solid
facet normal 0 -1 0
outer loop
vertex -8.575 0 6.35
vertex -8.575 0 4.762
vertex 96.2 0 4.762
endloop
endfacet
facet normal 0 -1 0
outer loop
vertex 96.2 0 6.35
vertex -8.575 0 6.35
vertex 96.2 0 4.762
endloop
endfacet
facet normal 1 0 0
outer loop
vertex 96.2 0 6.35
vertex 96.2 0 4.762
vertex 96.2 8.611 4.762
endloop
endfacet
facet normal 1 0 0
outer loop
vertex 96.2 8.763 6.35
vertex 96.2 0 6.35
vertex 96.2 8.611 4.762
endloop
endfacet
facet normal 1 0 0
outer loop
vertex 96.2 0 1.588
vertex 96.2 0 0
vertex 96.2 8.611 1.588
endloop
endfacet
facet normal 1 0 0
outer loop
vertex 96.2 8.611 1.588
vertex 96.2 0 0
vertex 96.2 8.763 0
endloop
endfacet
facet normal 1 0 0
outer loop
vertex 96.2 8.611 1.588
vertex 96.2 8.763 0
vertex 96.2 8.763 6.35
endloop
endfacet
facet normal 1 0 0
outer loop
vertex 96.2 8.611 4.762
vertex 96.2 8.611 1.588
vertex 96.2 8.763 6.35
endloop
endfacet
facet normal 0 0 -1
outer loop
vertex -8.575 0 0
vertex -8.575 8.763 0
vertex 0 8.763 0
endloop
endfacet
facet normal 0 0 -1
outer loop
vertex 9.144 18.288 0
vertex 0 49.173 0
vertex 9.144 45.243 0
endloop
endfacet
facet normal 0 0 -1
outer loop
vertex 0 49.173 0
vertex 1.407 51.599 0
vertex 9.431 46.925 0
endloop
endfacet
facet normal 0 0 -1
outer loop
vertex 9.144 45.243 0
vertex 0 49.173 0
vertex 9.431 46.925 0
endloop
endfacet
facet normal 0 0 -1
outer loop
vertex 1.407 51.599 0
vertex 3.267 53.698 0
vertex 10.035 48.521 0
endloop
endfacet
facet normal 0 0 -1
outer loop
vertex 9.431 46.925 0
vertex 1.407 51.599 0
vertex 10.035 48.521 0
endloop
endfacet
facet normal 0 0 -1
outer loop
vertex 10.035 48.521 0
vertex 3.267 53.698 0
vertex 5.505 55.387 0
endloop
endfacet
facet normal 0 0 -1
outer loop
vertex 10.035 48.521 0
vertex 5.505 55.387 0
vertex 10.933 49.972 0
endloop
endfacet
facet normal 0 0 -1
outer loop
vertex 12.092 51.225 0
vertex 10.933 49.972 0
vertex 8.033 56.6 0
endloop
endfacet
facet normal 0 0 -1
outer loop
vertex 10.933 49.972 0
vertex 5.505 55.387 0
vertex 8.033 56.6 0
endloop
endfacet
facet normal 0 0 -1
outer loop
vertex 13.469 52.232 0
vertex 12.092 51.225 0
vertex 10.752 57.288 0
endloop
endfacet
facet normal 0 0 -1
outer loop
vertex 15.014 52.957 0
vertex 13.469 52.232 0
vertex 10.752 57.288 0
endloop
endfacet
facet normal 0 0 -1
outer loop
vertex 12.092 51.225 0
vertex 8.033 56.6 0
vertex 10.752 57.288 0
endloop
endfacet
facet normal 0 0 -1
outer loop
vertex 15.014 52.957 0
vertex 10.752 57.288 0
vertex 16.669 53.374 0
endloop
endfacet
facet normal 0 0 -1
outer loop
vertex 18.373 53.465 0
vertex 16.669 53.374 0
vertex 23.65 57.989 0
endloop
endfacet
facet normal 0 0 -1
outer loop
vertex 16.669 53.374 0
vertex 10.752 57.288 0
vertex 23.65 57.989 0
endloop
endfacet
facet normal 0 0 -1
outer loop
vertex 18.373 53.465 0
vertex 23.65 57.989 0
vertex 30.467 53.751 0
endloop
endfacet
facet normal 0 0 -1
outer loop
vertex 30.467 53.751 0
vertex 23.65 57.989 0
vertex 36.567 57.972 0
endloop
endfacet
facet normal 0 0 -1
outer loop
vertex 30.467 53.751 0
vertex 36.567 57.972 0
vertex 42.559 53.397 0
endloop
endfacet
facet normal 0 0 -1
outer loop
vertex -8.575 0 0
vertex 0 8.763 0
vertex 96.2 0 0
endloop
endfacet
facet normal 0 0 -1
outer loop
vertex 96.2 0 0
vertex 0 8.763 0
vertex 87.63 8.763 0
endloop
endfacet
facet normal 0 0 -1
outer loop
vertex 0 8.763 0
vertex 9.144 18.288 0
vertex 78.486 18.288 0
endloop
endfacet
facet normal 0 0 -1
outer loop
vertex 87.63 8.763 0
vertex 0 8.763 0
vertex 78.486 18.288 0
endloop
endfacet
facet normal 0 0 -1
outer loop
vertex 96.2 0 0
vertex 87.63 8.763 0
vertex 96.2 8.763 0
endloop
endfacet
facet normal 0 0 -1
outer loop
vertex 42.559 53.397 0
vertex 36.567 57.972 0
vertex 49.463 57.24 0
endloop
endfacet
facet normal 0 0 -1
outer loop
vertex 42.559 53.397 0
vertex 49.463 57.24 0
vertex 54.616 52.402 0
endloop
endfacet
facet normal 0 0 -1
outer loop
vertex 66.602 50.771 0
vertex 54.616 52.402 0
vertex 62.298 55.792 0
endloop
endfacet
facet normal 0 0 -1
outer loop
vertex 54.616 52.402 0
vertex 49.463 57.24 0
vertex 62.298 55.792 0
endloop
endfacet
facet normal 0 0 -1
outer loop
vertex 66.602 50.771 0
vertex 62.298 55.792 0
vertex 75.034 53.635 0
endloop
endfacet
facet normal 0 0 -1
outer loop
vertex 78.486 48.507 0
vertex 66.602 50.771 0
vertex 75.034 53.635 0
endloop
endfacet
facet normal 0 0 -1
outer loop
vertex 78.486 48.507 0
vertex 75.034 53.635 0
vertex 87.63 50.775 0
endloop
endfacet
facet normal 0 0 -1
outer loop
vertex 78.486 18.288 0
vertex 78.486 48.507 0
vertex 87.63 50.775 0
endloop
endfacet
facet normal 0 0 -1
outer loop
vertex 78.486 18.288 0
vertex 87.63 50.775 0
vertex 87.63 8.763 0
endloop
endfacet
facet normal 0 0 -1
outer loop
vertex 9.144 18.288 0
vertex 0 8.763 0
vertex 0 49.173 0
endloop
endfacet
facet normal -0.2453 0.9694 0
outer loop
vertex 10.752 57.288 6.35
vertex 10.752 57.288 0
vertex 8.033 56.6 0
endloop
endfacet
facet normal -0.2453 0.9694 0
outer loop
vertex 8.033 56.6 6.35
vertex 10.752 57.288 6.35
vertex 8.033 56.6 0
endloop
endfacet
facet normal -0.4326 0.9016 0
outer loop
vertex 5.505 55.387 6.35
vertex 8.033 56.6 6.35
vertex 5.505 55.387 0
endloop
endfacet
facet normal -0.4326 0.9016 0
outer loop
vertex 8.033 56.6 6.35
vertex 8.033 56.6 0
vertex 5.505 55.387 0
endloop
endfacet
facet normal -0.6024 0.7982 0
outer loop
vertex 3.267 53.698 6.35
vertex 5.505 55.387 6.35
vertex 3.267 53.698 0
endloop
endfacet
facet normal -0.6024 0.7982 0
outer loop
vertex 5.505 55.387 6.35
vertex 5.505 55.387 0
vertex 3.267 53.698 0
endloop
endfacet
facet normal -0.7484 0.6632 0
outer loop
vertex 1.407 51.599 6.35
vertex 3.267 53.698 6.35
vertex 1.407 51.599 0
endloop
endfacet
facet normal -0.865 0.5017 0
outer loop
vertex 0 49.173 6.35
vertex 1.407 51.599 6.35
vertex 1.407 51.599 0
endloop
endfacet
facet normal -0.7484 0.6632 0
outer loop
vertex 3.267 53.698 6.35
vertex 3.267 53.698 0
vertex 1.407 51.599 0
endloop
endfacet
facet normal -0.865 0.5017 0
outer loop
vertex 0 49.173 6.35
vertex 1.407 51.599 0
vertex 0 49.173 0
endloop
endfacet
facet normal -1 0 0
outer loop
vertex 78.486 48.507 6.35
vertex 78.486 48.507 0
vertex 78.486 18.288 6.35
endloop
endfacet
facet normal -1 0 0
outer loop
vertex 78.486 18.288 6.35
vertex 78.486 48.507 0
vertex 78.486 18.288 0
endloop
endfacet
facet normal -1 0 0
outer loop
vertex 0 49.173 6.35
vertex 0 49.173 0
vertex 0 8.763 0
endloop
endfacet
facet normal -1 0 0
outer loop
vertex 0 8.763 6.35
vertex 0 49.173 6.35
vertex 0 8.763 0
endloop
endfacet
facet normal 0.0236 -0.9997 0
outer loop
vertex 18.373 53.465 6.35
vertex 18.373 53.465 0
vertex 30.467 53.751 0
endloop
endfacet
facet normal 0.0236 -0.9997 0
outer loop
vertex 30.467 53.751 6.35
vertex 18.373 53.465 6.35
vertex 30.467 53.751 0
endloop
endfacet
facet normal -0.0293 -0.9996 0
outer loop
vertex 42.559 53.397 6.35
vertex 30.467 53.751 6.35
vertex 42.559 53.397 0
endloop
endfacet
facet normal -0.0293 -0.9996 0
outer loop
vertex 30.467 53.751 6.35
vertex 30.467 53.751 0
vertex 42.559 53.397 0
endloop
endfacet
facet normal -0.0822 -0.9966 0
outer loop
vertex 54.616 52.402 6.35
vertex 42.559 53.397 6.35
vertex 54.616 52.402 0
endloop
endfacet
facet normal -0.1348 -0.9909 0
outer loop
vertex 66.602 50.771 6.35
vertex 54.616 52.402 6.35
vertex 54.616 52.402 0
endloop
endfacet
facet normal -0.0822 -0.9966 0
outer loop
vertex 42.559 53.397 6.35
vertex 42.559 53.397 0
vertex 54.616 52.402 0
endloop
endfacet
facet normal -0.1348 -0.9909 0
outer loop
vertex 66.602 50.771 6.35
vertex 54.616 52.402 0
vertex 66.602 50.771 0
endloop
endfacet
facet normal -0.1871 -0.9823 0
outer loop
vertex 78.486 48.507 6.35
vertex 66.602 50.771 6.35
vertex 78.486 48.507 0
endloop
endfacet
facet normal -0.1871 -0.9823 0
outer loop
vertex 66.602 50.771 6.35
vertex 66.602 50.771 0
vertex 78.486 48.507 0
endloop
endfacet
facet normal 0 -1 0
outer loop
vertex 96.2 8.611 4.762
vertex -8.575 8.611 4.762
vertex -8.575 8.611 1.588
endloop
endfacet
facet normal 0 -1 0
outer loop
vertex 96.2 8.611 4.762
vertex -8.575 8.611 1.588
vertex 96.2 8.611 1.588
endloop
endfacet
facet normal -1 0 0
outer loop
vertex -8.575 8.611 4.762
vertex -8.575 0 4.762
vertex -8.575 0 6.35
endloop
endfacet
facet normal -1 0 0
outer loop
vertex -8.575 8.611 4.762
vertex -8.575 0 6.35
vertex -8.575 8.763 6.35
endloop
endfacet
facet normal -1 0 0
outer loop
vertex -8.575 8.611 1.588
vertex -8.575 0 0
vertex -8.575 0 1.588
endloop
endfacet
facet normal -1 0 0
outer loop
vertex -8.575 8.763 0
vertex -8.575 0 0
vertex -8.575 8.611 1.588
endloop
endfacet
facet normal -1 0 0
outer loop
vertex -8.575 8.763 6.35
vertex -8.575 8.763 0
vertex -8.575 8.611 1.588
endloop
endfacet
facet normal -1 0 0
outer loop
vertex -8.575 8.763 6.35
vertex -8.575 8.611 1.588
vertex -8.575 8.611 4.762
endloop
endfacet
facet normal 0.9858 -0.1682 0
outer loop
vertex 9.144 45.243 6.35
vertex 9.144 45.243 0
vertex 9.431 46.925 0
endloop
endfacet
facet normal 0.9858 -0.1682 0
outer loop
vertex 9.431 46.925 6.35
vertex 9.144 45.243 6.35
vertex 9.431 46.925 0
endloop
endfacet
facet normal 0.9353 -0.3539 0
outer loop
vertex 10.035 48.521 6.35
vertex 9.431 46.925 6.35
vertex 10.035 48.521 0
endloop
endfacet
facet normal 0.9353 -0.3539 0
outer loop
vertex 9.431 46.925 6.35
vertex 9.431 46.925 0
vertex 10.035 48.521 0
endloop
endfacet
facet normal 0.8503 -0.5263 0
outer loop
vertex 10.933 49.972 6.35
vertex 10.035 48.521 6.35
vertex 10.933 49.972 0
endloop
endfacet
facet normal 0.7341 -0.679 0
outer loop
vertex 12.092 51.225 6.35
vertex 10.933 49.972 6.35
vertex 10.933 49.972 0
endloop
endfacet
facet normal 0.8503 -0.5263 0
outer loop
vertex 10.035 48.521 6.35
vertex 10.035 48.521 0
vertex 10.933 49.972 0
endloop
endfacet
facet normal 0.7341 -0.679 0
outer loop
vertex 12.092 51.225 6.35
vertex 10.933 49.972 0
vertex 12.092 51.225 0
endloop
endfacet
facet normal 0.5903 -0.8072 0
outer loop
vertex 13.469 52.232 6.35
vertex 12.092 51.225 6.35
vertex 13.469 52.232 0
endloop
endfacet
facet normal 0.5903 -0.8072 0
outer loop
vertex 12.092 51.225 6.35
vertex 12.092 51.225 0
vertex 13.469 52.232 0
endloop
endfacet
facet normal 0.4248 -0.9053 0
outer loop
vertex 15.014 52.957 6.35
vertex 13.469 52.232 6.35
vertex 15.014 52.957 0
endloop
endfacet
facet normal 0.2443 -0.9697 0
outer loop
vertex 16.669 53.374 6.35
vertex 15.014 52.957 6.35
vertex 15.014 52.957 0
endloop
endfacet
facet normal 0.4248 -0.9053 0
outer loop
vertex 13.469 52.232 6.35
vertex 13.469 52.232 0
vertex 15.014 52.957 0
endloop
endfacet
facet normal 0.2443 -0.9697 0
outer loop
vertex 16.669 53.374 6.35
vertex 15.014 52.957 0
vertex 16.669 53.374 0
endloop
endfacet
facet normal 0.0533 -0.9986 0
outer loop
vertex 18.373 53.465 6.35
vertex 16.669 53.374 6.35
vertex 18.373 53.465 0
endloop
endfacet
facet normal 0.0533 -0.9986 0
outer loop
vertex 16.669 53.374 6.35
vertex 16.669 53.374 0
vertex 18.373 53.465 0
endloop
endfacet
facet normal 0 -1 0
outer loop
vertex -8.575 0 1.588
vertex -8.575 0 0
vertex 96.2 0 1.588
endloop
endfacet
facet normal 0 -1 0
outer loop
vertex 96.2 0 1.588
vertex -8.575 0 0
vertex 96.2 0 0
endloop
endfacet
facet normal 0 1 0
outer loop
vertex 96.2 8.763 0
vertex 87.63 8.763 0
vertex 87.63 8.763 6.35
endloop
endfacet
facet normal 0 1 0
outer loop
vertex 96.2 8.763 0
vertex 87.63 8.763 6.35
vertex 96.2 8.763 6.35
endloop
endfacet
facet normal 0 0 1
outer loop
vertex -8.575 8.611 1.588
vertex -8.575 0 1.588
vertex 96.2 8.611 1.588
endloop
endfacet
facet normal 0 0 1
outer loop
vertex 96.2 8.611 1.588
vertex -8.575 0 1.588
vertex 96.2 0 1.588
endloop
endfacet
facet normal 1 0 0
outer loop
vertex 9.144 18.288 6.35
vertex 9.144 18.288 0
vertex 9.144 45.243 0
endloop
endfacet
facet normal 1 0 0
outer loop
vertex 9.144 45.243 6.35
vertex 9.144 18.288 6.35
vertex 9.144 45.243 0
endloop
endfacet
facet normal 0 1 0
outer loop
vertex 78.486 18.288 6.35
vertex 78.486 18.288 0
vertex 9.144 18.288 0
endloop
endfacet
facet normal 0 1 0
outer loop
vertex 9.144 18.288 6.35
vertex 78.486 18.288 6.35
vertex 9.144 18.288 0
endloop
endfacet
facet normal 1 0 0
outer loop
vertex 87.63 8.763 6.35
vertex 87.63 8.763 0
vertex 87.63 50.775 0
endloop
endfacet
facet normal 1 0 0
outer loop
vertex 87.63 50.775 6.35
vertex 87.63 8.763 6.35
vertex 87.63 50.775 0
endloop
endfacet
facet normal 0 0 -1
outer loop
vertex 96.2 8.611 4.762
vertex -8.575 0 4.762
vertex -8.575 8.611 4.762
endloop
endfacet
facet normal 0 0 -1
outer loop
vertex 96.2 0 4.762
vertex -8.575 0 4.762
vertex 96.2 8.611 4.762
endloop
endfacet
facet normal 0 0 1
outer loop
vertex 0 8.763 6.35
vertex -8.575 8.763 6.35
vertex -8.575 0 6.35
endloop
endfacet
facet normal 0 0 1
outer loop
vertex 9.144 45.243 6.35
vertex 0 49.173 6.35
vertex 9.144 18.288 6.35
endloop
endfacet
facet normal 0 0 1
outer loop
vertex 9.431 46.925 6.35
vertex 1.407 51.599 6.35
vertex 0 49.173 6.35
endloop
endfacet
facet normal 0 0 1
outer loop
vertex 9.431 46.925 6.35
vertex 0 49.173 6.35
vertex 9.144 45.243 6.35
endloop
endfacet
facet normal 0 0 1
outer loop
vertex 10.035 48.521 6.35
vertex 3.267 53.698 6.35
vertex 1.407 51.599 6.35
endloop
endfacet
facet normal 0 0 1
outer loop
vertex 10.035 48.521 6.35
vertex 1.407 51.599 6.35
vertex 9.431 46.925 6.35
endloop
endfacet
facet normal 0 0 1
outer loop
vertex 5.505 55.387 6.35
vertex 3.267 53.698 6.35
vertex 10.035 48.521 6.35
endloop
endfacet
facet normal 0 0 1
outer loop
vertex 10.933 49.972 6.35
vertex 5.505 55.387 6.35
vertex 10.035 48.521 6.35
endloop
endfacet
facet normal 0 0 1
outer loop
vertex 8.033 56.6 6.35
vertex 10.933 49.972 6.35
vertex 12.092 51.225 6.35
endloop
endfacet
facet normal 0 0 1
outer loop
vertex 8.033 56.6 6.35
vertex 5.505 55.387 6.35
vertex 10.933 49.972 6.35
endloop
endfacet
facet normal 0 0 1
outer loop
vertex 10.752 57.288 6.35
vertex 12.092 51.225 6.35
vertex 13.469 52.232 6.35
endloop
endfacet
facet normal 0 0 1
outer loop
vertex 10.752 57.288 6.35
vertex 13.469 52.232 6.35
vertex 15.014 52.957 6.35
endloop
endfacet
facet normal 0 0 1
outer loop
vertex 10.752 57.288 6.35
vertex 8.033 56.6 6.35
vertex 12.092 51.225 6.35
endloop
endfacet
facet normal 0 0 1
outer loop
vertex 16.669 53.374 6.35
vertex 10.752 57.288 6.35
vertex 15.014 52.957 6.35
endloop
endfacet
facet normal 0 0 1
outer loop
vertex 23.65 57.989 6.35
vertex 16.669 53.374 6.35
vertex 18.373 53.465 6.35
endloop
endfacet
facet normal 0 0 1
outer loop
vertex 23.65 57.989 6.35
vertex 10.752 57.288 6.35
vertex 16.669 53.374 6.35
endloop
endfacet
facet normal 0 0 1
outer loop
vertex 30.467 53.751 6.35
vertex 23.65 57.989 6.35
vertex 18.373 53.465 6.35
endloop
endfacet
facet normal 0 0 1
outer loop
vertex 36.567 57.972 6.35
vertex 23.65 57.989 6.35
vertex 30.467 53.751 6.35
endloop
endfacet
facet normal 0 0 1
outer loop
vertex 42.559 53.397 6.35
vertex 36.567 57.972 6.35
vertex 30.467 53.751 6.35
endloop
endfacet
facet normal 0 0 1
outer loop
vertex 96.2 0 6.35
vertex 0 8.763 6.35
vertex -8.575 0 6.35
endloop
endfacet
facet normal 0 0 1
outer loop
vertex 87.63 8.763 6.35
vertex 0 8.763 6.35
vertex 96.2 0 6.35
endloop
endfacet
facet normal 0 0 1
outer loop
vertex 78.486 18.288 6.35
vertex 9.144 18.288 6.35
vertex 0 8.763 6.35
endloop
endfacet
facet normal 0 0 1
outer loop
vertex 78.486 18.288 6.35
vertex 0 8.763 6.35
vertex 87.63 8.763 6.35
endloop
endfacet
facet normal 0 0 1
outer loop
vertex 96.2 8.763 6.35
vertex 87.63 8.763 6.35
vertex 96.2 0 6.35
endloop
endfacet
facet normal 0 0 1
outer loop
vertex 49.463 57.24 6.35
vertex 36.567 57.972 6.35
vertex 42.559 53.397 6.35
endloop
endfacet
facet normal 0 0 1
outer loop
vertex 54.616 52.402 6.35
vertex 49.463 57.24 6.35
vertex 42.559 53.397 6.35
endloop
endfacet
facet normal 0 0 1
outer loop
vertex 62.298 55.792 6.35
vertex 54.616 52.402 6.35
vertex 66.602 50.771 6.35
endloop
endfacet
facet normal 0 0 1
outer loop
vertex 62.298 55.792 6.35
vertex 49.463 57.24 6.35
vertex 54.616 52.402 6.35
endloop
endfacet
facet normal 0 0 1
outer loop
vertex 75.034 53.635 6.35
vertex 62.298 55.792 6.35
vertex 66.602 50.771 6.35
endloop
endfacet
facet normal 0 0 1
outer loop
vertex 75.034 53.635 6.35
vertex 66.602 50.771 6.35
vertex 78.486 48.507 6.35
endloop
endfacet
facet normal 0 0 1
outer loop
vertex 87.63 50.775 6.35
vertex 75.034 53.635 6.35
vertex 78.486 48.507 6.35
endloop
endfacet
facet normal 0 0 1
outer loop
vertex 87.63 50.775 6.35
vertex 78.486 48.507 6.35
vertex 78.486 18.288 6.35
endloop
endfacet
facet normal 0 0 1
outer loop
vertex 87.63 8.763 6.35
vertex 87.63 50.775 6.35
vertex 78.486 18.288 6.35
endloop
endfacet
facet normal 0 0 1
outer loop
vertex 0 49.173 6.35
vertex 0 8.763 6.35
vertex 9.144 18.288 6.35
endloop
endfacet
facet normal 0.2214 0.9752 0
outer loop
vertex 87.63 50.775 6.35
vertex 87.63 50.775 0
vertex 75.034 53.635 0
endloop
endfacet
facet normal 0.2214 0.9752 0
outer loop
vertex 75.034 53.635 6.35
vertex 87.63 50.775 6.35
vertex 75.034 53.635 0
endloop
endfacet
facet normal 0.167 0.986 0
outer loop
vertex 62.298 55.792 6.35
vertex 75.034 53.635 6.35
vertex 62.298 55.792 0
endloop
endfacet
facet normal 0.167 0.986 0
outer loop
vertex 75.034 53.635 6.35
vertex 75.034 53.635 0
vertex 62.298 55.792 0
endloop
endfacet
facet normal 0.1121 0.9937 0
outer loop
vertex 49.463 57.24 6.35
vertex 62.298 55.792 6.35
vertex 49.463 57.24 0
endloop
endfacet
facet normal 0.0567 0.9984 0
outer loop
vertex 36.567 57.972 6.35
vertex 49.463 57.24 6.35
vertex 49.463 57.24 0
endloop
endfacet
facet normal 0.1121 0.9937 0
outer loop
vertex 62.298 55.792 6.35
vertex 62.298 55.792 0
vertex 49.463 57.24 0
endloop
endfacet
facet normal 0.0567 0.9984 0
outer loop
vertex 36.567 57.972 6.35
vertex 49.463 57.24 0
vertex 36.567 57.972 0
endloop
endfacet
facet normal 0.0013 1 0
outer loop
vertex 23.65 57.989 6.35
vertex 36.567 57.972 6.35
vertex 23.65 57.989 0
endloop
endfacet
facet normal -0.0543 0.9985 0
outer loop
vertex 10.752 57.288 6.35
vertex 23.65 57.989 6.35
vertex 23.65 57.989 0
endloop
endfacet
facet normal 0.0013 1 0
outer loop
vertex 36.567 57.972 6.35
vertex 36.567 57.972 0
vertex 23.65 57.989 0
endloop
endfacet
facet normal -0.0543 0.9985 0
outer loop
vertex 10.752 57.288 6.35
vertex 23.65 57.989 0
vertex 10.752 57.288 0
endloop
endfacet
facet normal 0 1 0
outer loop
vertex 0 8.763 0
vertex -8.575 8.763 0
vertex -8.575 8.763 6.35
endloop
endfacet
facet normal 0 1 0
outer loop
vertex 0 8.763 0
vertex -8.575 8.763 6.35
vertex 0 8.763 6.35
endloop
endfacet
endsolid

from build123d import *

# Parameters (mm, degrees)
F0_W     = 8.57504
F0_H     = 8.763
F0_W_2   = 8.56996
F1_DEPTH = 6.35
F2_W     = 104.775
F2_H     = 3.175
F3_DEPTH = 8.6106


with BuildPart() as f1:
    # F0 (on Top) → F1 (new body)
    with BuildSketch(Plane.XY):
        with Locations((-4.28752, 4.3815)):
            Rectangle(F0_W, F0_H)
        with BuildLine():
            Line((0, 8.763), (0, 0))
            Line((0, 0), (87.63, 0))
            Line((87.63, 0), (87.63, 8.763))
            Line((87.63, 8.763), (87.63, 18.288))
            Line((87.63, 18.288), (87.63, 50.77453))
            ThreePointArc((87.63, 50.77453), (49.462914, 57.239683), (10.752161, 57.287836))
            ThreePointArc((10.752161, 57.287836), (4.343582, 54.59828), (0, 49.172703))
            Line((0, 49.172703), (0, 18.288))
            Line((0, 18.288), (0, 8.763))
        make_face()
        with BuildLine():
            Line((78.486, 18.288), (9.144, 18.288))
            Line((9.144, 18.288), (9.144, 45.242749))
            ThreePointArc((9.144, 45.242749), (12.091924, 51.224816), (18.373285, 53.465328))
            ThreePointArc((18.373285, 53.465328), (48.594074, 52.979261), (78.486, 48.50655))
            Line((78.486, 48.50655), (78.486, 18.288))
        make_face(mode=Mode.SUBTRACT)
        with Locations((91.91498, 4.3815)):
            Rectangle(F0_W_2, F0_H)
    extrude(amount=F1_DEPTH)

    # F2 (on face) → F3 (cut)
    with BuildSketch(Plane.XZ):
        with Locations((43.81246, 3.175)):
            Rectangle(F2_W, F2_H)
    extrude(amount=-F3_DEPTH, mode=Mode.SUBTRACT)


solid = f1.part
